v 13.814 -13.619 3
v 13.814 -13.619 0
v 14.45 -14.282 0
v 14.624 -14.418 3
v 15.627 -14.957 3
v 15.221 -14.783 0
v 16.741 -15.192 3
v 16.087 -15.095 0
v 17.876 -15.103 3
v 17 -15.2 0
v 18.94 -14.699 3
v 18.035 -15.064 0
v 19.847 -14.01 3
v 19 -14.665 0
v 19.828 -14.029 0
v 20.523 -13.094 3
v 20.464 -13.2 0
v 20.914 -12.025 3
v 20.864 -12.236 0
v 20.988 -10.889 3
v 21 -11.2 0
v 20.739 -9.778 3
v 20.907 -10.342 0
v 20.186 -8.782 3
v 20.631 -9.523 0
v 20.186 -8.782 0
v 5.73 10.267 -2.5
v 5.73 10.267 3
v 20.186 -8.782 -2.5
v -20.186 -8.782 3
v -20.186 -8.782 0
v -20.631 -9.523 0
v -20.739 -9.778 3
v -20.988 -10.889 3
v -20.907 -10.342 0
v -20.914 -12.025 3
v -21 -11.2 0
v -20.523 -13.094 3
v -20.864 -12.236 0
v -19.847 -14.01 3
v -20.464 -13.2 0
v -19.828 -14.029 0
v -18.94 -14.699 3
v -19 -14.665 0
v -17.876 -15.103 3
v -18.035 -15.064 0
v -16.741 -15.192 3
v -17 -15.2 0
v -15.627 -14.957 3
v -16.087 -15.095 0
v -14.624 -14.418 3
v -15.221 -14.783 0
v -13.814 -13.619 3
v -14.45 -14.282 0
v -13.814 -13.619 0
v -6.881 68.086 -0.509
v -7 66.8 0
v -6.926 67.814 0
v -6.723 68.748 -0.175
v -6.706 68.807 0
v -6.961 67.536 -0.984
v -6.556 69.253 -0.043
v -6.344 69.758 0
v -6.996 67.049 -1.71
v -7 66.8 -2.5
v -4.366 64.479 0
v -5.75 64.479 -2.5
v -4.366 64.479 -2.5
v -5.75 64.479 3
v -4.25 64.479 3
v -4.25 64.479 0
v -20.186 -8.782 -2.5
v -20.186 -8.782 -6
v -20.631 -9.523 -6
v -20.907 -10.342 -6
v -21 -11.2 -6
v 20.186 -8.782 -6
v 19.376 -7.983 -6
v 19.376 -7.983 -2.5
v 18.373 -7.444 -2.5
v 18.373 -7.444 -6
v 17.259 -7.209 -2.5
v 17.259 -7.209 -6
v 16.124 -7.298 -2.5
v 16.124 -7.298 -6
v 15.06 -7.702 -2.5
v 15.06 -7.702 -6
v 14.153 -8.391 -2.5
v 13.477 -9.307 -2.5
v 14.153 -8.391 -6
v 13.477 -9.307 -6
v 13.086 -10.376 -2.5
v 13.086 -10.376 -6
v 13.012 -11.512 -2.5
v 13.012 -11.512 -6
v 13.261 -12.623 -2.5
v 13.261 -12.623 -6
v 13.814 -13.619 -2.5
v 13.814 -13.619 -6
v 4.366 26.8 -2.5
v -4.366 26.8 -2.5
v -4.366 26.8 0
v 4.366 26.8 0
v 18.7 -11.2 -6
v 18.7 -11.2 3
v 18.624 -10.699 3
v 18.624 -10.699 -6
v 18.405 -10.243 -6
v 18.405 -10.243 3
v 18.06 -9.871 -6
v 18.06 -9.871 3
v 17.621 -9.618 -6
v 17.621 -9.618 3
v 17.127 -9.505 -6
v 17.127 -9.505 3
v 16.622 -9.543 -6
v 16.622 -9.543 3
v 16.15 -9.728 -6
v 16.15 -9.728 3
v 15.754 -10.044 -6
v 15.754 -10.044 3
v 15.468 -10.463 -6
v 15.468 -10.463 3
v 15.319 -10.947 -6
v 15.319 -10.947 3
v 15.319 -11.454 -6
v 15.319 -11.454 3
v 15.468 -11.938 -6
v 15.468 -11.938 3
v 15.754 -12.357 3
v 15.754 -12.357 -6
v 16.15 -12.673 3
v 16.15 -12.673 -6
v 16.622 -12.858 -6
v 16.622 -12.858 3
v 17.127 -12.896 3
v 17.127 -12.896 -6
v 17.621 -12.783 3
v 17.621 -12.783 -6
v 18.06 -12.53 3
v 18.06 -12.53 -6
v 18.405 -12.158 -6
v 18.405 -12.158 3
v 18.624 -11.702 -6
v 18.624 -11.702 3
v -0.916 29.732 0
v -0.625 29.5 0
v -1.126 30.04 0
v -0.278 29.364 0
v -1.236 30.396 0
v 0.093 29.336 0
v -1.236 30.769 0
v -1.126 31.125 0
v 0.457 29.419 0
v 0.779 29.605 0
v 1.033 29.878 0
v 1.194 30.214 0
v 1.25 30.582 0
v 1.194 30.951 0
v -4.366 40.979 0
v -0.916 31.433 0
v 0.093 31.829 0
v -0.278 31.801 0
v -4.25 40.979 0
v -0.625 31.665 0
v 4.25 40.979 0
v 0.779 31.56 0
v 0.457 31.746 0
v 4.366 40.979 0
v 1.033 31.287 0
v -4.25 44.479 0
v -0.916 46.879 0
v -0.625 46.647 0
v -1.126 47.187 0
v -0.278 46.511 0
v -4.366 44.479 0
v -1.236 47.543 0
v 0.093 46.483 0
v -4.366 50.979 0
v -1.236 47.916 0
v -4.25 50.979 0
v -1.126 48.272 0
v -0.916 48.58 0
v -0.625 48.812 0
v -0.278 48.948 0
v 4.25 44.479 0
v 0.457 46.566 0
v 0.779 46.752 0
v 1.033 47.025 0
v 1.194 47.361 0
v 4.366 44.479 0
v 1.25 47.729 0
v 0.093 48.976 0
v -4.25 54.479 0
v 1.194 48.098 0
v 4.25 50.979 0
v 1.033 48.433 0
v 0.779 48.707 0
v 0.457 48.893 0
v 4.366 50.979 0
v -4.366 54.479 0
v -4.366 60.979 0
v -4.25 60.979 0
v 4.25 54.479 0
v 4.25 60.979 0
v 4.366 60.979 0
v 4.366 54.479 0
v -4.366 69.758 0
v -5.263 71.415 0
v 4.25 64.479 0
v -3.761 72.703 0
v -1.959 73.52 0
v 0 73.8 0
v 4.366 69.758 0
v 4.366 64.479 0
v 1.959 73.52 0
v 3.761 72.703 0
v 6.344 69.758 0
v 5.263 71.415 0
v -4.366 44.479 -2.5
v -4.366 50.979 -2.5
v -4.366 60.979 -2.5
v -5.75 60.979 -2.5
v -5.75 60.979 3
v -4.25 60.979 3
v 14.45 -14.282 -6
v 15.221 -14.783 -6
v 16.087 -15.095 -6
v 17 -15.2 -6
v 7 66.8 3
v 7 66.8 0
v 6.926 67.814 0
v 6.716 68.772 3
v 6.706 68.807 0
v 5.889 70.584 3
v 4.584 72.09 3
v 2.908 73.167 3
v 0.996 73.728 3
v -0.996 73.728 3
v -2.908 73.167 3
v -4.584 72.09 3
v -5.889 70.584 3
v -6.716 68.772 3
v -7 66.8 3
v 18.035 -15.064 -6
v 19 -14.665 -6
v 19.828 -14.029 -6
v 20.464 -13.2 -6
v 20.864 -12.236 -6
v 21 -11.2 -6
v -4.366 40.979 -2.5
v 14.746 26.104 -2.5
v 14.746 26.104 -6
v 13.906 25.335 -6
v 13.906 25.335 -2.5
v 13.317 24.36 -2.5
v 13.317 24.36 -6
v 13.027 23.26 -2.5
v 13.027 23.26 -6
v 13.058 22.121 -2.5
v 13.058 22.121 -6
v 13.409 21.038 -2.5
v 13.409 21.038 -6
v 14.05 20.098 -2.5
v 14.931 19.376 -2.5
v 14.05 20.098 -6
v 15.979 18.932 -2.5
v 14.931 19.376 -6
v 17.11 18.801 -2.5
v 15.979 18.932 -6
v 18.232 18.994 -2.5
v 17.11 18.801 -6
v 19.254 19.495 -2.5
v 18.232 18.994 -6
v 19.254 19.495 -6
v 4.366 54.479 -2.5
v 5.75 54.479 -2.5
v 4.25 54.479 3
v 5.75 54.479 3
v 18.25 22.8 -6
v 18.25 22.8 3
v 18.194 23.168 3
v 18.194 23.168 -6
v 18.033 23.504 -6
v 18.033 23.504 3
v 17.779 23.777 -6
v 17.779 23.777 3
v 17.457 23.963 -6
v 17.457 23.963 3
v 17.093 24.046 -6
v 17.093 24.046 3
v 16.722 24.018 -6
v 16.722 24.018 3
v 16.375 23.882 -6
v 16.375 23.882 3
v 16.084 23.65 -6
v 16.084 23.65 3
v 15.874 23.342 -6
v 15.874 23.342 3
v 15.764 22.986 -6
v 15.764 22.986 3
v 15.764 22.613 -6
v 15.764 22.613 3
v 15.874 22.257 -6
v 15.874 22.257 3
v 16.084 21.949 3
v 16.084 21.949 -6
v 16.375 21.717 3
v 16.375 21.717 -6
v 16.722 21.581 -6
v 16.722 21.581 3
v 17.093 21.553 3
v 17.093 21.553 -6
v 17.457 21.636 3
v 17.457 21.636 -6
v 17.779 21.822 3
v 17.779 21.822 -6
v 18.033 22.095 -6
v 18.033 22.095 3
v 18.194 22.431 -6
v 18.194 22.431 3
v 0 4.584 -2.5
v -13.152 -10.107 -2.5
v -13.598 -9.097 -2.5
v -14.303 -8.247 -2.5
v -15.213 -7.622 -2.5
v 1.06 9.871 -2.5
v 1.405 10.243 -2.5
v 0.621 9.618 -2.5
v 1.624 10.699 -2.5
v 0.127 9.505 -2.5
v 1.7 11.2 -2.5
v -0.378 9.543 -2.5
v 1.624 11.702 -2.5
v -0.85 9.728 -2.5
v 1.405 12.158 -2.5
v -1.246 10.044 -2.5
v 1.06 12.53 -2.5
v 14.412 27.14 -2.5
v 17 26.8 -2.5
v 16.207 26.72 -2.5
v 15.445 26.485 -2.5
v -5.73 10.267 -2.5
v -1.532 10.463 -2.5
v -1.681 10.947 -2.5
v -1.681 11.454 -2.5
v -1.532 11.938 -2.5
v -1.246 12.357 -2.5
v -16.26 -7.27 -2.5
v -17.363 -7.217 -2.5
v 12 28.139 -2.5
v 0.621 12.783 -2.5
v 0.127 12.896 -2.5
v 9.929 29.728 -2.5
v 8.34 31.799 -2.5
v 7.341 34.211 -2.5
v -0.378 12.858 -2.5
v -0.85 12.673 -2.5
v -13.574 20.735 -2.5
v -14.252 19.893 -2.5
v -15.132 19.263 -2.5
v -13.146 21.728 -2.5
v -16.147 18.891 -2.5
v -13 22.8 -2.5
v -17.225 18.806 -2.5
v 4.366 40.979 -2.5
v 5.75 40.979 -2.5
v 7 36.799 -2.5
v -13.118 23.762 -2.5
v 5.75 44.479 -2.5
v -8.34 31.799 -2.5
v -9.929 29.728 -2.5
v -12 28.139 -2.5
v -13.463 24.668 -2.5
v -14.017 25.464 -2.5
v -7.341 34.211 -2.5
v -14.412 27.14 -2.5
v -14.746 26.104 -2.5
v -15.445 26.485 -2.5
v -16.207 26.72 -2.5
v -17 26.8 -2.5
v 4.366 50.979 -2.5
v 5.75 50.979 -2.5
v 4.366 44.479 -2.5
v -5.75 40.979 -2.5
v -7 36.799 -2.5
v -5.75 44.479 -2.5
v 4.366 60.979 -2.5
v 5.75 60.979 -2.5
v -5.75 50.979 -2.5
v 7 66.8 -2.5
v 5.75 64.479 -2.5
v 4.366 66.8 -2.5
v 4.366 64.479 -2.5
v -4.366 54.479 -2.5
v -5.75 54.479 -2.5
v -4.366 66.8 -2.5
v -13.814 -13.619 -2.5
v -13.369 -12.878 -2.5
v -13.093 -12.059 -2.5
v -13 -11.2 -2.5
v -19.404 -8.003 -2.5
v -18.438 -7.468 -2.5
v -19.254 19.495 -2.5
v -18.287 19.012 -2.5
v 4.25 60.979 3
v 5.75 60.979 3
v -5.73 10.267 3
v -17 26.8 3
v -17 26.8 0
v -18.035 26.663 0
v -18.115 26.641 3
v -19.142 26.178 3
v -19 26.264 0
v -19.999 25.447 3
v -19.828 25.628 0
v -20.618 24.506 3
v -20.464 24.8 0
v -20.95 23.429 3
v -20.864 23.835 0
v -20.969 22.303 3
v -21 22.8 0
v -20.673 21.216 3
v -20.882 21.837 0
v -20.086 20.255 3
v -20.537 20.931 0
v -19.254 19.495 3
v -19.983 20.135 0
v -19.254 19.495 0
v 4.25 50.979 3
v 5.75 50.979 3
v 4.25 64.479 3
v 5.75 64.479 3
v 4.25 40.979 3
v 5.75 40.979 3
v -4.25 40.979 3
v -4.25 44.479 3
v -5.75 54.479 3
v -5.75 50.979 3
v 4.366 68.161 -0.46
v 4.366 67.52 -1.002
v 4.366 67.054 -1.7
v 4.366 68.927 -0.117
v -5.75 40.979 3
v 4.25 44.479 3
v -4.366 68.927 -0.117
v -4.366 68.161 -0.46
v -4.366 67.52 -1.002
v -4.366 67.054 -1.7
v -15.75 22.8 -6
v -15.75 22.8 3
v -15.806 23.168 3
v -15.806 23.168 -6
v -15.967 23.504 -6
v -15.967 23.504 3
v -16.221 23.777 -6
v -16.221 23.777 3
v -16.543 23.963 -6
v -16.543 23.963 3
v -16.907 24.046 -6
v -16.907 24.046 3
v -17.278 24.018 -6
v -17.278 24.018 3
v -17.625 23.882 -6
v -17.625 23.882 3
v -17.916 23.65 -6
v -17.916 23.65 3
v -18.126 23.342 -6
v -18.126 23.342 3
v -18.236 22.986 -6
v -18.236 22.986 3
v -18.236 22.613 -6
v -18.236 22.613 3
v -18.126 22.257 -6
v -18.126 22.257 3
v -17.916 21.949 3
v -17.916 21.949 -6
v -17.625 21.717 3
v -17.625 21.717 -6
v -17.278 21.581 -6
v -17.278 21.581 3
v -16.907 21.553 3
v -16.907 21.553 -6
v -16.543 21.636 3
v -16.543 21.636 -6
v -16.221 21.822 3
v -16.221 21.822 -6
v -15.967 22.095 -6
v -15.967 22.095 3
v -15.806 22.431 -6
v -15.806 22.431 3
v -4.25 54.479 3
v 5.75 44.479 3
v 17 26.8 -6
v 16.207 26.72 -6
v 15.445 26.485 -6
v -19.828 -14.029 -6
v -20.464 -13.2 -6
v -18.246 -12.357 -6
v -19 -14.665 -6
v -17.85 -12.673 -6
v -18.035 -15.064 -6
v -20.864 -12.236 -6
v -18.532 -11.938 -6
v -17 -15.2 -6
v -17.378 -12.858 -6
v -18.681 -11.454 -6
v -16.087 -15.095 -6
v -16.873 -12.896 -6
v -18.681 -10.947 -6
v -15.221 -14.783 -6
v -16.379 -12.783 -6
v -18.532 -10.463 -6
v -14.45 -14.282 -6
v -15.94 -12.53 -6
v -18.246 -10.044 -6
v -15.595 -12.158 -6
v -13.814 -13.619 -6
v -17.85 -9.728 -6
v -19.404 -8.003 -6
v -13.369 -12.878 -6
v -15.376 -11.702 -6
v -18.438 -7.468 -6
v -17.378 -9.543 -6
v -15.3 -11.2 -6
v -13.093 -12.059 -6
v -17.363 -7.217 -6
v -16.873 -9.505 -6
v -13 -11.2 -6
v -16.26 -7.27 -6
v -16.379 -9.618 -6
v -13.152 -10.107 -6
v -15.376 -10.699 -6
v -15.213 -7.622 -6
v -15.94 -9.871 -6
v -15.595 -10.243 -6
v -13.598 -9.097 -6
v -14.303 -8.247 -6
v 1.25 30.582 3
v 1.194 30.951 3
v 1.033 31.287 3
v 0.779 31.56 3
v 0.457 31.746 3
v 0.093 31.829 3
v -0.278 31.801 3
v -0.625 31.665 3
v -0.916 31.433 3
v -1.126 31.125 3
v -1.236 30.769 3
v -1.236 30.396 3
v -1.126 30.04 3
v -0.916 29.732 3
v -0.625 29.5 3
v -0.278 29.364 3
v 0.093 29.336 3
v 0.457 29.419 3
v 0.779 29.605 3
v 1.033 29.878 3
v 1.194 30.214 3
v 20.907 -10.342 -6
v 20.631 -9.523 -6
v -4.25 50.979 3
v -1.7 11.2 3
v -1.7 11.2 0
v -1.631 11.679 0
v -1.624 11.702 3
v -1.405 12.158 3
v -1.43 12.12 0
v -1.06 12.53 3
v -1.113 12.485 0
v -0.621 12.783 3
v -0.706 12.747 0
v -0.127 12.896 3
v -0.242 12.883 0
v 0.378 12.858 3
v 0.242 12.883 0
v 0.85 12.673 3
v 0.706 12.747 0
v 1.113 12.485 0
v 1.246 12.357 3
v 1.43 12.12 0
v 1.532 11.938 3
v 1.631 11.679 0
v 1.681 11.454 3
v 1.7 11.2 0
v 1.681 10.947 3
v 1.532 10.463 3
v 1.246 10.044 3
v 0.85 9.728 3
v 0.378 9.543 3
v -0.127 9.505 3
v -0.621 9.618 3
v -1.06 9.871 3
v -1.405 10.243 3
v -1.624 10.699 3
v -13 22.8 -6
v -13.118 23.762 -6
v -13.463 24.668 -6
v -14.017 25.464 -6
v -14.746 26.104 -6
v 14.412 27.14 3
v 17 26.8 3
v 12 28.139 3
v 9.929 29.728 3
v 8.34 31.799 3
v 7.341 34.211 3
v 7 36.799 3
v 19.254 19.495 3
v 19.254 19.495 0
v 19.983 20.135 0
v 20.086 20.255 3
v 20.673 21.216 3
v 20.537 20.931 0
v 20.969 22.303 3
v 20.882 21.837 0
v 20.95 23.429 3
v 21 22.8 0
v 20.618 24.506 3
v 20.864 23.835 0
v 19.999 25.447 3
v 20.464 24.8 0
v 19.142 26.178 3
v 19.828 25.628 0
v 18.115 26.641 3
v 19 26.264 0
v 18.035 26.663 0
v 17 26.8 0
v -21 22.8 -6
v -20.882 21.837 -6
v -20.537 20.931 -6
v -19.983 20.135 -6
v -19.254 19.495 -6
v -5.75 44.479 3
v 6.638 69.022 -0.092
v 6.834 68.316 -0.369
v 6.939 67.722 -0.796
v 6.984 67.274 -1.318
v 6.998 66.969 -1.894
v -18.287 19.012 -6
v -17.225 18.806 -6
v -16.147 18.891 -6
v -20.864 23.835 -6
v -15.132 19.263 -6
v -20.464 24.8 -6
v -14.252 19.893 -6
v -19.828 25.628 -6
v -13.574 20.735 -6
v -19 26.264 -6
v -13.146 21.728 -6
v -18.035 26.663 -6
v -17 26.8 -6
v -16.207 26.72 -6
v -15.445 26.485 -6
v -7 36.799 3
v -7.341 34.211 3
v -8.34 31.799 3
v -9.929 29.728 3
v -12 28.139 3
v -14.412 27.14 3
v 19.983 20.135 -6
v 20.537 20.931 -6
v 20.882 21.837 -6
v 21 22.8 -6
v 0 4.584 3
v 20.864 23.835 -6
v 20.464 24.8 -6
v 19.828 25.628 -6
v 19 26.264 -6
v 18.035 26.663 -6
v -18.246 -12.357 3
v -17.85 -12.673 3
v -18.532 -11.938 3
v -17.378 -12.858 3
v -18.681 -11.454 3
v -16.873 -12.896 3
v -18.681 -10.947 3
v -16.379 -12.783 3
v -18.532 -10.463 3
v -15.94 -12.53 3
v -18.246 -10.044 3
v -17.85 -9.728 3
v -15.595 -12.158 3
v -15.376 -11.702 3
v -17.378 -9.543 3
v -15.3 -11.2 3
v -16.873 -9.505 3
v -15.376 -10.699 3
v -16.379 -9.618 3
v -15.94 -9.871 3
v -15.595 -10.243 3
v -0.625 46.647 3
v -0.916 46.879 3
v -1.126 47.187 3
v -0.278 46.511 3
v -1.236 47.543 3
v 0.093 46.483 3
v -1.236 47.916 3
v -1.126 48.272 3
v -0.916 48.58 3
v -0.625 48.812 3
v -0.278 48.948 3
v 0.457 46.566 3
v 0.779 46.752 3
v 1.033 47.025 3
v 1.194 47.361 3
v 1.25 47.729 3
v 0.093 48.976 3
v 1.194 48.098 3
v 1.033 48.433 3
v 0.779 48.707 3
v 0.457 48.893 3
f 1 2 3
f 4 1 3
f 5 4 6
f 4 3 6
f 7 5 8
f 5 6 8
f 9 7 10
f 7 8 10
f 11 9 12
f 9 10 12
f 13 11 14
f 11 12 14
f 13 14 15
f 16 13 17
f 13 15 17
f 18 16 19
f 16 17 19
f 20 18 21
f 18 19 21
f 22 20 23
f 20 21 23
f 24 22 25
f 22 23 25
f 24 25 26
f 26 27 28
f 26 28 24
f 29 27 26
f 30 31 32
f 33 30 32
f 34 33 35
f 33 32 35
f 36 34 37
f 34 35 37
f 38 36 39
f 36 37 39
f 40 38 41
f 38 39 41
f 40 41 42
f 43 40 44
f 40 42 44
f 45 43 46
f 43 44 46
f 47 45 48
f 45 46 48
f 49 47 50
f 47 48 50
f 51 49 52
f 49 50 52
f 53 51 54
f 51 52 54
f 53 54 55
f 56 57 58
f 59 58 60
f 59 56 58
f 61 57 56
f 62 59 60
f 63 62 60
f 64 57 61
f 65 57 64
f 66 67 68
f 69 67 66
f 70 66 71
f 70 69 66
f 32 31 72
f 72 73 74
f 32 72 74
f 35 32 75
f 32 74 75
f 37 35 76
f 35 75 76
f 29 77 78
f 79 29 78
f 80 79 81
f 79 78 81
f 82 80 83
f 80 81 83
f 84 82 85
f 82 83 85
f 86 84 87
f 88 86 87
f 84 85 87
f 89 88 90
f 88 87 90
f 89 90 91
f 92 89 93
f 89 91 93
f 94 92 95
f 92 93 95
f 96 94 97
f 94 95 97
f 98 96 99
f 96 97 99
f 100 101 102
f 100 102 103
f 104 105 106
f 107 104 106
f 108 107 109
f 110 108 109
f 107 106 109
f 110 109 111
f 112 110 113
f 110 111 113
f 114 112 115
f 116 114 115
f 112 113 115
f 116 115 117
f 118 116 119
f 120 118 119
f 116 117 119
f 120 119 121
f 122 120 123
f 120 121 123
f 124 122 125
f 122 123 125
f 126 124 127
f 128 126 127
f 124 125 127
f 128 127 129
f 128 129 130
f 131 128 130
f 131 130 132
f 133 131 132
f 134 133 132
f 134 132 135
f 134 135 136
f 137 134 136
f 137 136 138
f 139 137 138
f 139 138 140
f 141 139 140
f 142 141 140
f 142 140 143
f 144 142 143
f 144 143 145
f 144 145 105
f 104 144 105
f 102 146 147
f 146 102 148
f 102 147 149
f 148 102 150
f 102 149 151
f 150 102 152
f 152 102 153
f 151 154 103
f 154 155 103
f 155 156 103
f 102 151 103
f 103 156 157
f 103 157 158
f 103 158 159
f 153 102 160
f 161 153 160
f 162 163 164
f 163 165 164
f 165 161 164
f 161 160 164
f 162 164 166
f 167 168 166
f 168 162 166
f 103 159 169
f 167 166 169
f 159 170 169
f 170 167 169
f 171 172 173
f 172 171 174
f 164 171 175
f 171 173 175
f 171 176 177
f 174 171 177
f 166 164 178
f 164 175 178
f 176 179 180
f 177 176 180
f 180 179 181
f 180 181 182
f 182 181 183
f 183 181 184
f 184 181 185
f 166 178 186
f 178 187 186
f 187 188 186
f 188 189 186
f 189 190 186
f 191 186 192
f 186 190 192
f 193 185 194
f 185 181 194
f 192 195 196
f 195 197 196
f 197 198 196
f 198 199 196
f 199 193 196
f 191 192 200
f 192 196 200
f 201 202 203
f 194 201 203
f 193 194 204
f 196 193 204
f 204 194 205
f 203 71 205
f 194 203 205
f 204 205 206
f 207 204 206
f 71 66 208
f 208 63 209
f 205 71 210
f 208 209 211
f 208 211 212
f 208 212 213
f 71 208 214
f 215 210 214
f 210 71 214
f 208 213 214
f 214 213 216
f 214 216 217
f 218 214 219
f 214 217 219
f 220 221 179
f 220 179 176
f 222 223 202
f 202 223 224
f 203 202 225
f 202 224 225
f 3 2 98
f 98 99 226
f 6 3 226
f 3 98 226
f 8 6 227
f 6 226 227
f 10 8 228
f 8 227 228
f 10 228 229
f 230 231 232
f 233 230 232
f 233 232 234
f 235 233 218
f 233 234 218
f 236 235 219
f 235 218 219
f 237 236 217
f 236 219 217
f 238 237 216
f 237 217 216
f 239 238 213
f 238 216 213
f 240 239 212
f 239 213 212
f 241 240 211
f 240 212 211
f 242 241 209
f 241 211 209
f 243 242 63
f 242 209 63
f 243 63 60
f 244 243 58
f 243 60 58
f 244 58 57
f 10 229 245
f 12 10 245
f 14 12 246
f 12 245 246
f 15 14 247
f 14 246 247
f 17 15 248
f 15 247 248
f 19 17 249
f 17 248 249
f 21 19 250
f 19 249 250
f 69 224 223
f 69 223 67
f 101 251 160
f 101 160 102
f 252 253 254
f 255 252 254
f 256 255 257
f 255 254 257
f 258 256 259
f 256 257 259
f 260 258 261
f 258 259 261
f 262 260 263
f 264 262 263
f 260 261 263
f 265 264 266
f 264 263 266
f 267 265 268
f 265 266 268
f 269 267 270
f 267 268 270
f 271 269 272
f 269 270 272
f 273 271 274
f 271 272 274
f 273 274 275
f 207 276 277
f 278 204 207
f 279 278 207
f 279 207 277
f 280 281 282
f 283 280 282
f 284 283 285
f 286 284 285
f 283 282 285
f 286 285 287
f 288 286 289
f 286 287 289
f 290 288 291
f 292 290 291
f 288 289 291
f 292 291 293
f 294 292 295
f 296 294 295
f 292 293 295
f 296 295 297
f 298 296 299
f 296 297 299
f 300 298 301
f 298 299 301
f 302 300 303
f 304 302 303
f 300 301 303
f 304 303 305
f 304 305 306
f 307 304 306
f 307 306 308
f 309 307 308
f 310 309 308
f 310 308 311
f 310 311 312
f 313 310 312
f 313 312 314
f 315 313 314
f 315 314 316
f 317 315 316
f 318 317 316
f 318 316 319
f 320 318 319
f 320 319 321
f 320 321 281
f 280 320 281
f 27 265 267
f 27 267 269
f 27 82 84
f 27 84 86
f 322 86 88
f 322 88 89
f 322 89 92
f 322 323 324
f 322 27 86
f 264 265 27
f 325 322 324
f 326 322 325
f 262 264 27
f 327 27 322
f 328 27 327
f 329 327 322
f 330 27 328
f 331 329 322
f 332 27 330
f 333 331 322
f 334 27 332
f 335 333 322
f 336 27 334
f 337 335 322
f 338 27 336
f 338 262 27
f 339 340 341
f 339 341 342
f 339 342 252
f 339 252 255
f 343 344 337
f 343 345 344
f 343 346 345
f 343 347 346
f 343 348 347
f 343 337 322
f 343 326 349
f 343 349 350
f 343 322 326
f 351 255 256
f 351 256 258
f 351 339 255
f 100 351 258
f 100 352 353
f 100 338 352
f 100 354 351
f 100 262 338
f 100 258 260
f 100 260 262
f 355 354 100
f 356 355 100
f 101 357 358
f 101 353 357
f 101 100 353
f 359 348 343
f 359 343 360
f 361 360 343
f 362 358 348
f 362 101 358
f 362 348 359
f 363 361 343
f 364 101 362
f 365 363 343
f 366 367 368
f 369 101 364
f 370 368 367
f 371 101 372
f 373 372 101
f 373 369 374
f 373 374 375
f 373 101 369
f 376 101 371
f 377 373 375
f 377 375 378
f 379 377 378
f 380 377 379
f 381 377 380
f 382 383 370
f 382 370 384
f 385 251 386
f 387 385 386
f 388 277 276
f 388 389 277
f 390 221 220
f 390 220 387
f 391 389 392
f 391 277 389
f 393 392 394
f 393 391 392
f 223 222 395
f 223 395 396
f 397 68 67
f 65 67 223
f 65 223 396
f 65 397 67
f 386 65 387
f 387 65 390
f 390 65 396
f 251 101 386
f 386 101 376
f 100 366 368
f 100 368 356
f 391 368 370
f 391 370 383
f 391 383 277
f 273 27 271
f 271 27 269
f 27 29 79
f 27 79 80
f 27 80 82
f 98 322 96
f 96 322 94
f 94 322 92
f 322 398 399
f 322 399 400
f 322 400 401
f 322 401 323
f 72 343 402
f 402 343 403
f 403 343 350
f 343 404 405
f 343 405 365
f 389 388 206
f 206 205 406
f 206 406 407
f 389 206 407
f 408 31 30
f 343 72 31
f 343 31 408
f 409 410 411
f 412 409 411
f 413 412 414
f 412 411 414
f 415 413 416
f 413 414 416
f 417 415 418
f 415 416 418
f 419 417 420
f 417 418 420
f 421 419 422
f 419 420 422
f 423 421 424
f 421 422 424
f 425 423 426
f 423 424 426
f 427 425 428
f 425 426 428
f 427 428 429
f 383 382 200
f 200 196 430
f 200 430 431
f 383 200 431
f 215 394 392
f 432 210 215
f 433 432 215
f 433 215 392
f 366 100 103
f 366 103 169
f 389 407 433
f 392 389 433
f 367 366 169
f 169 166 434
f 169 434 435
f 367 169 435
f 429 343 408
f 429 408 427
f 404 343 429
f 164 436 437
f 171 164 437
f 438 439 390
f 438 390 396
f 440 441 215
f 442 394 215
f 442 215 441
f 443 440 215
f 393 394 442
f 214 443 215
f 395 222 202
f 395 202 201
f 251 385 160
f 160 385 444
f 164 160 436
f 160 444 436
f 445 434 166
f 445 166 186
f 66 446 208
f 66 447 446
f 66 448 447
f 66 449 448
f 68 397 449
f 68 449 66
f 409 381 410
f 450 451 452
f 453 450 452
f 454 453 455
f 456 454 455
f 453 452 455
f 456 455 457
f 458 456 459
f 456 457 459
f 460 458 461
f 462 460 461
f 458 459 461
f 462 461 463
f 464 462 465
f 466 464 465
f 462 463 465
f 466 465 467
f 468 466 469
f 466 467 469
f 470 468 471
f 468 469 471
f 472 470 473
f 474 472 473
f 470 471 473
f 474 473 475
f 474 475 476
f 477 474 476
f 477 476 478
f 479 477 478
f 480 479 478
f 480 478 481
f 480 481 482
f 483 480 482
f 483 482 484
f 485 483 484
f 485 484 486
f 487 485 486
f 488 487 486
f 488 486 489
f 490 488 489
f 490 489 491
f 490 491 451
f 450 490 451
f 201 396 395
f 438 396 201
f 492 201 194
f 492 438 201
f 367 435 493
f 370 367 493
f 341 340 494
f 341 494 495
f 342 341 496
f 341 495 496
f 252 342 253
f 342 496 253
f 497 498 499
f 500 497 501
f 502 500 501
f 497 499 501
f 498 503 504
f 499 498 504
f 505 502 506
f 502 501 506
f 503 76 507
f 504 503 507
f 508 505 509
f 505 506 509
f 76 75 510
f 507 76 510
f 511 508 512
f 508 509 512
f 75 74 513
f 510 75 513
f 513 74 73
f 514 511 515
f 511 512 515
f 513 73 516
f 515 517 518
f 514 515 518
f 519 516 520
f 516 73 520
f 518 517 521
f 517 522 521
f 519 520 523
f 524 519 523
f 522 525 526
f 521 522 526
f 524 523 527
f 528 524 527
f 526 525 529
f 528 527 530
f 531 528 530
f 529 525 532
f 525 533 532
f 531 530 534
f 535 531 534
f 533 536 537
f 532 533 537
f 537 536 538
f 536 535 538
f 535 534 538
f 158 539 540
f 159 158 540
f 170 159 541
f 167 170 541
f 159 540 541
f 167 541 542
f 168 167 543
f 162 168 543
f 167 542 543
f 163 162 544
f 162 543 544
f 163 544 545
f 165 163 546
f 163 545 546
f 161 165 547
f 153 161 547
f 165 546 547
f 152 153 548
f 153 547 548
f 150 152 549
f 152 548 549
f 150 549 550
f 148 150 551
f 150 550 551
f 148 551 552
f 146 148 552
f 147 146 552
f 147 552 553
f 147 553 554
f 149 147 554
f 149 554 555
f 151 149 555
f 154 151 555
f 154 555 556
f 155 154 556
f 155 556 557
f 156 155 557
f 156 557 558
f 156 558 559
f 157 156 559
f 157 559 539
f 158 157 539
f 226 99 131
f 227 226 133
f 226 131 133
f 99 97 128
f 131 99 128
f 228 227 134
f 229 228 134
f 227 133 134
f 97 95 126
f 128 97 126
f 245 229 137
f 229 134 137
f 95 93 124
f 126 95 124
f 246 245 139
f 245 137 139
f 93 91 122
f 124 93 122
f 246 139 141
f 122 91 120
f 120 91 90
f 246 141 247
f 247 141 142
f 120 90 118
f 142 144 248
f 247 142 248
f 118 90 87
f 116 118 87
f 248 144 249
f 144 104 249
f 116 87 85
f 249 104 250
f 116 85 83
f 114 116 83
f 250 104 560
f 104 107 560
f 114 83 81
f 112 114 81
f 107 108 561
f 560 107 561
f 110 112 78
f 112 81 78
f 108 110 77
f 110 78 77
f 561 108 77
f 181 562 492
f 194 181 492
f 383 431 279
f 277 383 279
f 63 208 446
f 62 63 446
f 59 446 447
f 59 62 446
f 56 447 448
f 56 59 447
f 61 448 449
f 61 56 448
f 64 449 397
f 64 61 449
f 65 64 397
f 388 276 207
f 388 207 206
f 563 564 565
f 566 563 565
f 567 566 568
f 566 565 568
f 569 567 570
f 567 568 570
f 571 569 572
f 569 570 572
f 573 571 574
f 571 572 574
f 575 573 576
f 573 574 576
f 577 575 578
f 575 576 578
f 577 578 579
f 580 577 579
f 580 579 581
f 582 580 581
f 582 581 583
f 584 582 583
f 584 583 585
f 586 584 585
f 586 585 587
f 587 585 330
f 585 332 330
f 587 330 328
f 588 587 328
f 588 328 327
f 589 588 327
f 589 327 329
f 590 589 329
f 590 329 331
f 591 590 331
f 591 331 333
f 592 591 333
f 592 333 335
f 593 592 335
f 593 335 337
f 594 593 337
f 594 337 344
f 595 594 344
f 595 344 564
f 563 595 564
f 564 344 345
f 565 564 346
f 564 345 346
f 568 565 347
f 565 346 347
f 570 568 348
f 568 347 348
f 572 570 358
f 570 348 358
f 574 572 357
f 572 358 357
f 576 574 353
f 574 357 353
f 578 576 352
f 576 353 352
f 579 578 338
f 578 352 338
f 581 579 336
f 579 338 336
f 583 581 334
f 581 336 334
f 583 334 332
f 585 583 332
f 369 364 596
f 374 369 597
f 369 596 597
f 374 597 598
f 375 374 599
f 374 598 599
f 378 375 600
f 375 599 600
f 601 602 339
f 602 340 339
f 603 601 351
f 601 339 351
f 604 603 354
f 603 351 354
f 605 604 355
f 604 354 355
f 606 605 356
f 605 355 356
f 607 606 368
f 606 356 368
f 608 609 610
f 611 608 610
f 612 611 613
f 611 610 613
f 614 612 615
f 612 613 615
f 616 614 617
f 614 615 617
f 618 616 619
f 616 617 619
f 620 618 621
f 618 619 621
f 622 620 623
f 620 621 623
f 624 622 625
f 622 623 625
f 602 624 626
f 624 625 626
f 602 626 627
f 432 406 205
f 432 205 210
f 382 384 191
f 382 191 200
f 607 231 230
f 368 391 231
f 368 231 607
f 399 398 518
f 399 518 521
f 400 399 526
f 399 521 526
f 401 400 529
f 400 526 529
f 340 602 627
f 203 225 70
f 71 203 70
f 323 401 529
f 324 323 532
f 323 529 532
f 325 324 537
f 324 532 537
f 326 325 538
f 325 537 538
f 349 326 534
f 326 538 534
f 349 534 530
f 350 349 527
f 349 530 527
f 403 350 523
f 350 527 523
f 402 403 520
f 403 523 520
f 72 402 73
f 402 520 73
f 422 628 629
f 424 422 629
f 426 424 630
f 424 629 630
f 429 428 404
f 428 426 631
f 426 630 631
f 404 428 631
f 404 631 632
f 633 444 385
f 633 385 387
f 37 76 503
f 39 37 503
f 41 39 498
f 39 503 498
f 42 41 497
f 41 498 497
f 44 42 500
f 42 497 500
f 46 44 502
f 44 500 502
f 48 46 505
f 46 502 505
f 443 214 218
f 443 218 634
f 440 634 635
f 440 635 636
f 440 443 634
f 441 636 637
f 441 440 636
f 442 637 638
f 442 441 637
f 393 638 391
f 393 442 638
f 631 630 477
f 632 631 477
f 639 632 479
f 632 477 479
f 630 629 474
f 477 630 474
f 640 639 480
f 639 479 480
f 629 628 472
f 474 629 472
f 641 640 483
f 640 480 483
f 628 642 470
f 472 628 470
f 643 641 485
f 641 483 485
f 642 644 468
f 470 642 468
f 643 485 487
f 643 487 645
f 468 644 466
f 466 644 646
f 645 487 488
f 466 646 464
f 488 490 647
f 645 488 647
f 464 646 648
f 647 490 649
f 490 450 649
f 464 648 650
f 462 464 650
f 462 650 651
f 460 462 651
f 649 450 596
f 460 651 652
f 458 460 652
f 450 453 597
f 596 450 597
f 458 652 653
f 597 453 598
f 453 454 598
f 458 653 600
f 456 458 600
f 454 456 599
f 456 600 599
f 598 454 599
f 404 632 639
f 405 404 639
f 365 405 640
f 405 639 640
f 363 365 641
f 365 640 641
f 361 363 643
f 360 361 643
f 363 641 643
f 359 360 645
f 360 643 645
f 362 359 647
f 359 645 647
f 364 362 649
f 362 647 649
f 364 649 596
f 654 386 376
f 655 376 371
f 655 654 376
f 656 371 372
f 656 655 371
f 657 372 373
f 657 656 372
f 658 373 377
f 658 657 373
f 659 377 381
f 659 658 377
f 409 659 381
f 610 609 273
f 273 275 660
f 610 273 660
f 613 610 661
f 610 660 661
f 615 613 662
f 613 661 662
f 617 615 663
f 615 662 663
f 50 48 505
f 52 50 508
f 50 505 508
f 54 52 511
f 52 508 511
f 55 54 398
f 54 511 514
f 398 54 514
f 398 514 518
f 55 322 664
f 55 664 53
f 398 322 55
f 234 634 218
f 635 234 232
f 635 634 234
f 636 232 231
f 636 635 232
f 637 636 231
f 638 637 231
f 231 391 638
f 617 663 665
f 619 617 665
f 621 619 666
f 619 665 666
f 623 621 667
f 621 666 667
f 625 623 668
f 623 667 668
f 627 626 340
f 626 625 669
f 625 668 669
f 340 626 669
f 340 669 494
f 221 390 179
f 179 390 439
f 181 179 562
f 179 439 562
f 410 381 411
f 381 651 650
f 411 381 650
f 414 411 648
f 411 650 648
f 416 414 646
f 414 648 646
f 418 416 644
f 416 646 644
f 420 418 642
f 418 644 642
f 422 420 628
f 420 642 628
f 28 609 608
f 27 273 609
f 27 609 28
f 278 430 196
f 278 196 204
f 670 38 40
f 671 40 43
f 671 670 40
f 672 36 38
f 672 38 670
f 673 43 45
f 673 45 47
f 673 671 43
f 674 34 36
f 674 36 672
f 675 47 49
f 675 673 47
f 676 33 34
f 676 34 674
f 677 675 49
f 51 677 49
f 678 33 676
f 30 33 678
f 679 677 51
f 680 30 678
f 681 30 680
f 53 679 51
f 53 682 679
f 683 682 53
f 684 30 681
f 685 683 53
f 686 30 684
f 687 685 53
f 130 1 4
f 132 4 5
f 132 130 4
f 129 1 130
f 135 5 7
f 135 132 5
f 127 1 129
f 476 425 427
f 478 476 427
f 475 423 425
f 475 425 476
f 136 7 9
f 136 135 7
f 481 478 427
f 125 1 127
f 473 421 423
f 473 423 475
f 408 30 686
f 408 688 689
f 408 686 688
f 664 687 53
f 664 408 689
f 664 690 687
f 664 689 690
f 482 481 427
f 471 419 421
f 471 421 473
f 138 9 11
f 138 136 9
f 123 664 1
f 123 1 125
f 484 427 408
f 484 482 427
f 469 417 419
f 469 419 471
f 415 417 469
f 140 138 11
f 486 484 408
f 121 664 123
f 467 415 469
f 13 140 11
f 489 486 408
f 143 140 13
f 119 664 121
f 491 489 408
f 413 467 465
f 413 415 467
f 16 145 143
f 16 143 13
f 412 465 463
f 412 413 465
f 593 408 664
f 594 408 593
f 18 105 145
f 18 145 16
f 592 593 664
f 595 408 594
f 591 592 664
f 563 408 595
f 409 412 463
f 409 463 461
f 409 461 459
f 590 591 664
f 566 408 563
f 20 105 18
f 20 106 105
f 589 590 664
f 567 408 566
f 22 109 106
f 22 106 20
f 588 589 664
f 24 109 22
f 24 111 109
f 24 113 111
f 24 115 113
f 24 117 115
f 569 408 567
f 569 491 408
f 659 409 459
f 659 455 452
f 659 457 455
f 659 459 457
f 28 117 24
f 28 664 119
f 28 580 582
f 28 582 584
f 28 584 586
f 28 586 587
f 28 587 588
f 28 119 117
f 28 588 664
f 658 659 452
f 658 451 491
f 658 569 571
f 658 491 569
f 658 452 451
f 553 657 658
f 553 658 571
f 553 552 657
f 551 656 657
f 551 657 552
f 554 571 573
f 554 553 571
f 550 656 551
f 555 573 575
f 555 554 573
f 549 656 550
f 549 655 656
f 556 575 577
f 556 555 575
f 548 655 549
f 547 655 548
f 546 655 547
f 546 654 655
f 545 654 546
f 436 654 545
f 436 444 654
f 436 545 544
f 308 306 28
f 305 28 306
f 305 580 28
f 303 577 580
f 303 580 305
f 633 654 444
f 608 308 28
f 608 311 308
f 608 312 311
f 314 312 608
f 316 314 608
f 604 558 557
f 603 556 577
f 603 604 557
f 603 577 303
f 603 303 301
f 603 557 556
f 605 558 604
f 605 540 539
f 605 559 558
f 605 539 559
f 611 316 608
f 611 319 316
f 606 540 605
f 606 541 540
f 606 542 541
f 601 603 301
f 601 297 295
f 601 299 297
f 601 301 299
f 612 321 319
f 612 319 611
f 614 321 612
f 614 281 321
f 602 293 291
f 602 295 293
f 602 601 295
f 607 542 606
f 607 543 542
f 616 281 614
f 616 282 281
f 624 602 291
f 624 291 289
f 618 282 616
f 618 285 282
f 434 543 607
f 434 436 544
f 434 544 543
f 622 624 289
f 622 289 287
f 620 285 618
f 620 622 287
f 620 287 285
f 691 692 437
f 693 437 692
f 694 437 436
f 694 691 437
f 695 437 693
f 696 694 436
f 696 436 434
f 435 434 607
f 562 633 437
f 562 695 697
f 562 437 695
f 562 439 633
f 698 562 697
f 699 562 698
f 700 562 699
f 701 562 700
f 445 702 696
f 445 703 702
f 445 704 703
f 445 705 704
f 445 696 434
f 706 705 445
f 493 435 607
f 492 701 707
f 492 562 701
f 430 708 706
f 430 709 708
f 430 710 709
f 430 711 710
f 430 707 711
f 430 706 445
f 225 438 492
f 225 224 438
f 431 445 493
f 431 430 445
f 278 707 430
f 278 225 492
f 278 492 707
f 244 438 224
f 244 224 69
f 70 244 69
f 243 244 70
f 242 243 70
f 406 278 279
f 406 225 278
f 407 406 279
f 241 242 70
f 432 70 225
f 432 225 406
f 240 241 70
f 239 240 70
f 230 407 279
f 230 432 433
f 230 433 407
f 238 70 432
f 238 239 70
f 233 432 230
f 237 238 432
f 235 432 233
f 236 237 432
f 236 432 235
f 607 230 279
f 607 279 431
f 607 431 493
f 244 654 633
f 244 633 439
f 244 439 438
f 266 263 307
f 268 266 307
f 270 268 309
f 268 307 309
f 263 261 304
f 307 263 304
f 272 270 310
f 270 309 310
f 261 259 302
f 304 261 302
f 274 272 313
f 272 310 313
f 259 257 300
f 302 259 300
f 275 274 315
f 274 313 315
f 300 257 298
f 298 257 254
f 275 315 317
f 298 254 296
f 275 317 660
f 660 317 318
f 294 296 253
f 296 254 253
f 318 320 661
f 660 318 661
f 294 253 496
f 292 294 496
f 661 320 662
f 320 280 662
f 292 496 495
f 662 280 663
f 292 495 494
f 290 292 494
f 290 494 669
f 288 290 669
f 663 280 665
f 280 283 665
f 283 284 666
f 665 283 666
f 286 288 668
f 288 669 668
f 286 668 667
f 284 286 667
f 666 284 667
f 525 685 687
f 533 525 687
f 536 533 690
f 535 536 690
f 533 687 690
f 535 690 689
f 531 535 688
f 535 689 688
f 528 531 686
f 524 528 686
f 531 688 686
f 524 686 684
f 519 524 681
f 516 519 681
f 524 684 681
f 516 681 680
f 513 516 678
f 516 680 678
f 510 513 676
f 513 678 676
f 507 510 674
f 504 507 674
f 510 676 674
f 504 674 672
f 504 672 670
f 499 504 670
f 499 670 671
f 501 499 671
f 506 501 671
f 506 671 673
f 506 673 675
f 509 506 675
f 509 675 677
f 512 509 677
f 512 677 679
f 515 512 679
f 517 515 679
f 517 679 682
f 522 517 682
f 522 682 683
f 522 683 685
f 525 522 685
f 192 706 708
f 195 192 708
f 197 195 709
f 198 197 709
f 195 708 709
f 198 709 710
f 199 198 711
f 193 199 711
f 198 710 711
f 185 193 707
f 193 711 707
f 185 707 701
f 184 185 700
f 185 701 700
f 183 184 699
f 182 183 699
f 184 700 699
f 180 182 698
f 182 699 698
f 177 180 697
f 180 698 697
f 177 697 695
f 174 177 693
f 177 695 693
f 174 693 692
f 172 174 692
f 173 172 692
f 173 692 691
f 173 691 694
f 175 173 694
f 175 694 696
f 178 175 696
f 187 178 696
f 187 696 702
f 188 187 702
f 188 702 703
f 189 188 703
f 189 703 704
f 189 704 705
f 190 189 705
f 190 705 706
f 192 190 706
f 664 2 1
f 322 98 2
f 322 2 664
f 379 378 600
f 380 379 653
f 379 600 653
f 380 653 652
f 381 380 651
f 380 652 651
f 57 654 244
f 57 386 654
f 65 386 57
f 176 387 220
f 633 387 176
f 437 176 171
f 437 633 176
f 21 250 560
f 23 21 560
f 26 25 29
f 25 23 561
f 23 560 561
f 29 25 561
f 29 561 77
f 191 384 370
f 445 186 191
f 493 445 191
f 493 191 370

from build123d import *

# Parameters (mm, degrees)
BOSS_EXTRUDE1_DEPTH             = 3
BOSS_EXTRUDE2_START             = -6
BOSS_EXTRUDE2_DEPTH             = 6
TAP_DRILL_FOR_M3X0_5_TAP1_D     = 2.5
TAP_DRILL_FOR_M3X0_5_TAP1_DEPTH = 10
TAP_DRILL_FOR_M3X0_5_TAP1_TIP   = 0.751075774
M3_CLEARANCE_HOLE1_D            = 3.4
M3_CLEARANCE_HOLE1_DEPTH        = 10
M3_CLEARANCE_HOLE1_TIP          = 1.021463052
M3_CLEARANCE_HOLE2_D            = 3.4
M3_CLEARANCE_HOLE2_DEPTH        = 10
M3_CLEARANCE_HOLE2_TIP          = 1.021463052
BOSS_EXTRUDE3_START             = 2.5
SKETCH9_R                       = 1.7
BOSS_EXTRUDE3_DEPTH             = 2.5
TAP_DRILL_FOR_M3X0_5_TAP2_D     = 2.5
TAP_DRILL_FOR_M3X0_5_TAP2_DEPTH = 10
TAP_DRILL_FOR_M3X0_5_TAP2_TIP   = 0.751075774
SKETCH8_W                       = 1.5
SKETCH8_H                       = 3.5
CUT_EXTRUDE1_DEPTH              = 15
FILLET3_R                       = 3
FILLET4_R                       = 10


# Some blends are built 0.0001 mm under size
with BuildPart() as part:
    # Sketch1 → Boss-Extrude1 (new body)
    with BuildSketch(Plane.XY):
        with BuildLine():
            Line((-5.729559867, 10.267386408), (-20.186344056, -8.782393513))
            ThreePointArc((-20.186344056, -8.782393513), (-19.418100816, -14.386838385), (-13.813655944, -13.618595145))
            Line((-13.813655944, -13.618595145), (0, 4.583731333))
            Line((0, 4.583731333), (13.813655944, -13.618595145))
            ThreePointArc((13.813655944, -13.618595145), (19.418100816, -14.386838385), (20.186344056, -8.782393513))
            Line((20.186344056, -8.782393513), (5.729559867, 10.267386408))
            Line((5.729559867, 10.267386408), (19.254422206, 19.495329447))
            ThreePointArc((19.254422206, 19.495329447), (20.822087446, 23.979186794), (17, 26.799505671))
            Line((17, 26.799505671), (7, 26.799505671))
            Line((7, 26.799505671), (7, 66.799505671))
            ThreePointArc((7, 66.799505671), (0, 73.799505671), (-7, 66.799505671))
            Line((-7, 66.799505671), (-7, 26.799505671))
            Line((-7, 26.799505671), (-17, 26.799505671))
            ThreePointArc((-17, 26.799505671), (-20.822087446, 23.979186794), (-19.254422206, 19.495329447))
            Line((-19.254422206, 19.495329447), (-5.729559867, 10.267386408))
        make_face()
    extrude(amount=BOSS_EXTRUDE1_DEPTH)

    # Sketch1<3> → Boss-Extrude2 (add)
    with BuildSketch(Plane.XY.offset(BOSS_EXTRUDE2_START)):
        with BuildLine():
            ThreePointArc((-21, 22.799505671), (-20.536784473, 20.931042241), (-19.254422206, 19.495329447))
            ThreePointArc((-19.254422206, 19.495329447), (-15.13153657, 19.262721197), (-13, 22.799505671))
            ThreePointArc((-13, 22.799505671), (-13.463215527, 24.667969101), (-14.745577794, 26.103681895))
            ThreePointArc((-14.745577794, 26.103681895), (-15.820318877, 26.621593117), (-17, 26.799505671))
            ThreePointArc((-17, 26.799505671), (-19.828427125, 25.627932795), (-21, 22.799505671))
        make_face()
        with BuildLine():
            ThreePointArc((14.745577794, 26.103681895), (13.695823776, 20.545083465), (19.254422206, 19.495329447))
            ThreePointArc((19.254422206, 19.495329447), (20.536784473, 20.931042241), (21, 22.799505671))
            ThreePointArc((21, 22.799505671), (19.828427125, 25.627932795), (17, 26.799505671))
            ThreePointArc((17, 26.799505671), (15.820318877, 26.621593117), (14.745577794, 26.103681895))
        make_face()
        with BuildLine():
            ThreePointArc((20.186344056, -8.782393513), (14.581899184, -8.014150273), (13.813655944, -13.618595145))
            ThreePointArc((13.813655944, -13.618595145), (15.221293063, -14.783258853), (17, -15.200494329))
            ThreePointArc((17, -15.200494329), (19.828427125, -14.028921454), (21, -11.200494329))
            ThreePointArc((21, -11.200494329), (20.791132827, -9.924832976), (20.186344056, -8.782393513))
        make_face()
        with BuildLine():
            ThreePointArc((-17, -15.200494329), (-15.221293063, -14.783258853), (-13.813655944, -13.618595145))
            ThreePointArc((-13.813655944, -13.618595145), (-13.208867173, -12.476155682), (-13, -11.200494329))
            ThreePointArc((-13, -11.200494329), (-15.724338647, -7.409361502), (-20.186344056, -8.782393513))
            ThreePointArc((-20.186344056, -8.782393513), (-20.791132827, -9.924832976), (-21, -11.200494329))
            ThreePointArc((-21, -11.200494329), (-19.828427125, -14.028921454), (-17, -15.200494329))
        make_face()
    extrude(amount=BOSS_EXTRUDE2_DEPTH)

    # Tap Drill for M3x0.5 Tap1
    with Locations(Plane(origin=(0, 0, -6), x_dir=(-1, 0, 0), z_dir=(0, 0, -1))):
        with Locations((17, 22.799505671), (-17, 22.799505671)):
            Hole(TAP_DRILL_FOR_M3X0_5_TAP1_D / 2, depth=TAP_DRILL_FOR_M3X0_5_TAP1_DEPTH)
            with Locations((0, 0, -(TAP_DRILL_FOR_M3X0_5_TAP1_DEPTH + TAP_DRILL_FOR_M3X0_5_TAP1_TIP / 2))):  # 118° drill point
                Cone(0, TAP_DRILL_FOR_M3X0_5_TAP1_D / 2, TAP_DRILL_FOR_M3X0_5_TAP1_TIP, mode=Mode.SUBTRACT)

    # M3 Clearance Hole1
    with Locations(Plane(origin=(0, 0, -6), x_dir=(-1, 0, 0), z_dir=(0, 0, -1))):
        with Locations((-17, -11.200494329), (17, -11.200494329)):
            Hole(M3_CLEARANCE_HOLE1_D / 2, depth=M3_CLEARANCE_HOLE1_DEPTH)
            with Locations((0, 0, -(M3_CLEARANCE_HOLE1_DEPTH + M3_CLEARANCE_HOLE1_TIP / 2))):  # 118° drill point
                Cone(0, M3_CLEARANCE_HOLE1_D / 2, M3_CLEARANCE_HOLE1_TIP, mode=Mode.SUBTRACT)

    # M3 Clearance Hole2
    with Locations(Plane.XY.offset(3)):
        with Locations((0, 11.200494329)):
            Hole(M3_CLEARANCE_HOLE2_D / 2, depth=M3_CLEARANCE_HOLE2_DEPTH)
            with Locations((0, 0, -(M3_CLEARANCE_HOLE2_DEPTH + M3_CLEARANCE_HOLE2_TIP / 2))):  # 118° drill point
                Cone(0, M3_CLEARANCE_HOLE2_D / 2, M3_CLEARANCE_HOLE2_TIP, mode=Mode.SUBTRACT)

    # Sketch9 → Boss-Extrude3 (add)
    with BuildSketch(Plane(origin=(0, 0, 0), x_dir=(-1, 0, 0), z_dir=(0, 0, -1)).offset(BOSS_EXTRUDE3_START)):
        with BuildLine():
            Line((7, 66.799505671), (4.365625, 66.799505671))
            Line((4.365625, 66.799505671), (4.365625, 26.799505671))
            Line((4.365625, 26.799505671), (-4.365625, 26.799505671))
            Line((-4.365625, 26.799505671), (-4.365625, 66.799505671))
            Line((-4.365625, 66.799505671), (-7, 66.799505671))
            Line((-7, 66.799505671), (-7, 26.799505671))
            Line((-7, 26.799505671), (-17, 26.799505671))
            ThreePointArc((-17, 26.799505671), (-13.177912554, 21.619824548), (-19.254422206, 19.495329447))
            Line((-19.254422206, 19.495329447), (-5.729559867, 10.267386408))
            Line((-5.729559867, 10.267386408), (-20.186344056, -8.782393513))
            ThreePointArc((-20.186344056, -8.782393513), (-14.581899184, -8.014150273), (-13.813655944, -13.618595145))
            Line((-13.813655944, -13.618595145), (0, 4.583731333))
            Line((0, 4.583731333), (13.813655944, -13.618595145))
            ThreePointArc((13.813655944, -13.618595145), (14.581899184, -8.014150273), (20.186344056, -8.782393513))
            Line((20.186344056, -8.782393513), (5.729559867, 10.267386408))
            Line((5.729559867, 10.267386408), (19.254422206, 19.495329447))
            ThreePointArc((19.254422206, 19.495329447), (13.177912554, 21.619824548), (17, 26.799505671))
            Line((17, 26.799505671), (7, 26.799505671))
            Line((7, 26.799505671), (7, 66.799505671))
        make_face()
        with Locations(Location((0, 11.200494329, 0), (0, 0, 179.999999992))):
            Circle(SKETCH9_R, mode=Mode.SUBTRACT)
    extrude(amount=-BOSS_EXTRUDE3_DEPTH)

    # Tap Drill for M3x0.5 Tap2
    with Locations(Plane(origin=(0, 0, 0), x_dir=(-1, 0, 0), z_dir=(0, 0, -1))):
        with Locations((0, 30.58245731), (0, 47.72934455)):
            Hole(TAP_DRILL_FOR_M3X0_5_TAP2_D / 2, depth=TAP_DRILL_FOR_M3X0_5_TAP2_DEPTH)
            with Locations((0, 0, -(TAP_DRILL_FOR_M3X0_5_TAP2_DEPTH + TAP_DRILL_FOR_M3X0_5_TAP2_TIP / 2))):  # 118° drill point
                Cone(0, TAP_DRILL_FOR_M3X0_5_TAP2_D / 2, TAP_DRILL_FOR_M3X0_5_TAP2_TIP, mode=Mode.SUBTRACT)

    # Sketch8 → Cut-Extrude1 (cut)
    with BuildSketch(Plane.XY.offset(3)):
        with Locations((5, 42.72934455)):
            Rectangle(SKETCH8_W, SKETCH8_H)
        with Locations((-5, 42.72934455)):
            Rectangle(SKETCH8_W, SKETCH8_H)
        with Locations((5, 52.72934455)):
            Rectangle(SKETCH8_W, SKETCH8_H)
        with Locations((-5, 52.72934455)):
            Rectangle(SKETCH8_W, SKETCH8_H)
        with Locations((-5, 62.72934455)):
            Rectangle(SKETCH8_W, SKETCH8_H)
        with Locations((5, 62.72934455)):
            Rectangle(SKETCH8_W, SKETCH8_H)
    extrude(amount=-CUT_EXTRUDE1_DEPTH, mode=Mode.SUBTRACT)

    # Fillet3
    # the kernel refuses this fillet: 3 mm, written as the material it adds along each edge
    with BuildSketch(Plane(origin=(4.365625, 66.799505671, 0), x_dir=(0, 0, -1), z_dir=(1, 0, 0))) as fillet3_piece_1_section:
        with BuildLine():
            CenterArc((3, 2.958039892), FILLET3_R, 180, 80.405931773)
            Line((0, 2.958039892), (0, 0))
            Line((0, 0), (2.5, 0))
        make_face()
    fillet3_piece_1 = extrude(amount=10.029474729, mode=Mode.PRIVATE)
    fillet3_piece_1 = fillet3_piece_1 & Plane(origin=(0, 66.799505671, -0.704129577), x_dir=(1, 0, 0), z_dir=(0, 0, -1)) * Cylinder(7, 32, mode=Mode.PRIVATE)
    add(fillet3_piece_1)
    with BuildSketch(Plane(origin=(-14.395099729, 66.799505671, 0), x_dir=(0, 0, -1), z_dir=(1, 0, 0))) as fillet3_piece_2_section:
        with BuildLine():
            CenterArc((3, 2.958039892), FILLET3_R, 180, 80.405931773)
            Line((0, 2.958039892), (0, 0))
            Line((0, 0), (2.5, 0))
        make_face()
    fillet3_piece_2 = extrude(amount=10.029474729, mode=Mode.PRIVATE)
    fillet3_piece_2 = fillet3_piece_2 & Plane(origin=(0, 66.799505671, -0.704129577), x_dir=(1, 0, 0), z_dir=(0, 0, -1)) * Cylinder(7, 32, mode=Mode.PRIVATE)
    add(fillet3_piece_2)

    # Fillet4
    fillet4_edges = [part.edges().sort_by_distance(p)[0] for p in [
        (7, 26.799505671, 0.25),
        (-7, 26.799505671, 0.25),
    ]]
    fillet(fillet4_edges, radius=FILLET4_R - 0.0001)  # a hair under: the kernel refuses the full size


solid = part.part
